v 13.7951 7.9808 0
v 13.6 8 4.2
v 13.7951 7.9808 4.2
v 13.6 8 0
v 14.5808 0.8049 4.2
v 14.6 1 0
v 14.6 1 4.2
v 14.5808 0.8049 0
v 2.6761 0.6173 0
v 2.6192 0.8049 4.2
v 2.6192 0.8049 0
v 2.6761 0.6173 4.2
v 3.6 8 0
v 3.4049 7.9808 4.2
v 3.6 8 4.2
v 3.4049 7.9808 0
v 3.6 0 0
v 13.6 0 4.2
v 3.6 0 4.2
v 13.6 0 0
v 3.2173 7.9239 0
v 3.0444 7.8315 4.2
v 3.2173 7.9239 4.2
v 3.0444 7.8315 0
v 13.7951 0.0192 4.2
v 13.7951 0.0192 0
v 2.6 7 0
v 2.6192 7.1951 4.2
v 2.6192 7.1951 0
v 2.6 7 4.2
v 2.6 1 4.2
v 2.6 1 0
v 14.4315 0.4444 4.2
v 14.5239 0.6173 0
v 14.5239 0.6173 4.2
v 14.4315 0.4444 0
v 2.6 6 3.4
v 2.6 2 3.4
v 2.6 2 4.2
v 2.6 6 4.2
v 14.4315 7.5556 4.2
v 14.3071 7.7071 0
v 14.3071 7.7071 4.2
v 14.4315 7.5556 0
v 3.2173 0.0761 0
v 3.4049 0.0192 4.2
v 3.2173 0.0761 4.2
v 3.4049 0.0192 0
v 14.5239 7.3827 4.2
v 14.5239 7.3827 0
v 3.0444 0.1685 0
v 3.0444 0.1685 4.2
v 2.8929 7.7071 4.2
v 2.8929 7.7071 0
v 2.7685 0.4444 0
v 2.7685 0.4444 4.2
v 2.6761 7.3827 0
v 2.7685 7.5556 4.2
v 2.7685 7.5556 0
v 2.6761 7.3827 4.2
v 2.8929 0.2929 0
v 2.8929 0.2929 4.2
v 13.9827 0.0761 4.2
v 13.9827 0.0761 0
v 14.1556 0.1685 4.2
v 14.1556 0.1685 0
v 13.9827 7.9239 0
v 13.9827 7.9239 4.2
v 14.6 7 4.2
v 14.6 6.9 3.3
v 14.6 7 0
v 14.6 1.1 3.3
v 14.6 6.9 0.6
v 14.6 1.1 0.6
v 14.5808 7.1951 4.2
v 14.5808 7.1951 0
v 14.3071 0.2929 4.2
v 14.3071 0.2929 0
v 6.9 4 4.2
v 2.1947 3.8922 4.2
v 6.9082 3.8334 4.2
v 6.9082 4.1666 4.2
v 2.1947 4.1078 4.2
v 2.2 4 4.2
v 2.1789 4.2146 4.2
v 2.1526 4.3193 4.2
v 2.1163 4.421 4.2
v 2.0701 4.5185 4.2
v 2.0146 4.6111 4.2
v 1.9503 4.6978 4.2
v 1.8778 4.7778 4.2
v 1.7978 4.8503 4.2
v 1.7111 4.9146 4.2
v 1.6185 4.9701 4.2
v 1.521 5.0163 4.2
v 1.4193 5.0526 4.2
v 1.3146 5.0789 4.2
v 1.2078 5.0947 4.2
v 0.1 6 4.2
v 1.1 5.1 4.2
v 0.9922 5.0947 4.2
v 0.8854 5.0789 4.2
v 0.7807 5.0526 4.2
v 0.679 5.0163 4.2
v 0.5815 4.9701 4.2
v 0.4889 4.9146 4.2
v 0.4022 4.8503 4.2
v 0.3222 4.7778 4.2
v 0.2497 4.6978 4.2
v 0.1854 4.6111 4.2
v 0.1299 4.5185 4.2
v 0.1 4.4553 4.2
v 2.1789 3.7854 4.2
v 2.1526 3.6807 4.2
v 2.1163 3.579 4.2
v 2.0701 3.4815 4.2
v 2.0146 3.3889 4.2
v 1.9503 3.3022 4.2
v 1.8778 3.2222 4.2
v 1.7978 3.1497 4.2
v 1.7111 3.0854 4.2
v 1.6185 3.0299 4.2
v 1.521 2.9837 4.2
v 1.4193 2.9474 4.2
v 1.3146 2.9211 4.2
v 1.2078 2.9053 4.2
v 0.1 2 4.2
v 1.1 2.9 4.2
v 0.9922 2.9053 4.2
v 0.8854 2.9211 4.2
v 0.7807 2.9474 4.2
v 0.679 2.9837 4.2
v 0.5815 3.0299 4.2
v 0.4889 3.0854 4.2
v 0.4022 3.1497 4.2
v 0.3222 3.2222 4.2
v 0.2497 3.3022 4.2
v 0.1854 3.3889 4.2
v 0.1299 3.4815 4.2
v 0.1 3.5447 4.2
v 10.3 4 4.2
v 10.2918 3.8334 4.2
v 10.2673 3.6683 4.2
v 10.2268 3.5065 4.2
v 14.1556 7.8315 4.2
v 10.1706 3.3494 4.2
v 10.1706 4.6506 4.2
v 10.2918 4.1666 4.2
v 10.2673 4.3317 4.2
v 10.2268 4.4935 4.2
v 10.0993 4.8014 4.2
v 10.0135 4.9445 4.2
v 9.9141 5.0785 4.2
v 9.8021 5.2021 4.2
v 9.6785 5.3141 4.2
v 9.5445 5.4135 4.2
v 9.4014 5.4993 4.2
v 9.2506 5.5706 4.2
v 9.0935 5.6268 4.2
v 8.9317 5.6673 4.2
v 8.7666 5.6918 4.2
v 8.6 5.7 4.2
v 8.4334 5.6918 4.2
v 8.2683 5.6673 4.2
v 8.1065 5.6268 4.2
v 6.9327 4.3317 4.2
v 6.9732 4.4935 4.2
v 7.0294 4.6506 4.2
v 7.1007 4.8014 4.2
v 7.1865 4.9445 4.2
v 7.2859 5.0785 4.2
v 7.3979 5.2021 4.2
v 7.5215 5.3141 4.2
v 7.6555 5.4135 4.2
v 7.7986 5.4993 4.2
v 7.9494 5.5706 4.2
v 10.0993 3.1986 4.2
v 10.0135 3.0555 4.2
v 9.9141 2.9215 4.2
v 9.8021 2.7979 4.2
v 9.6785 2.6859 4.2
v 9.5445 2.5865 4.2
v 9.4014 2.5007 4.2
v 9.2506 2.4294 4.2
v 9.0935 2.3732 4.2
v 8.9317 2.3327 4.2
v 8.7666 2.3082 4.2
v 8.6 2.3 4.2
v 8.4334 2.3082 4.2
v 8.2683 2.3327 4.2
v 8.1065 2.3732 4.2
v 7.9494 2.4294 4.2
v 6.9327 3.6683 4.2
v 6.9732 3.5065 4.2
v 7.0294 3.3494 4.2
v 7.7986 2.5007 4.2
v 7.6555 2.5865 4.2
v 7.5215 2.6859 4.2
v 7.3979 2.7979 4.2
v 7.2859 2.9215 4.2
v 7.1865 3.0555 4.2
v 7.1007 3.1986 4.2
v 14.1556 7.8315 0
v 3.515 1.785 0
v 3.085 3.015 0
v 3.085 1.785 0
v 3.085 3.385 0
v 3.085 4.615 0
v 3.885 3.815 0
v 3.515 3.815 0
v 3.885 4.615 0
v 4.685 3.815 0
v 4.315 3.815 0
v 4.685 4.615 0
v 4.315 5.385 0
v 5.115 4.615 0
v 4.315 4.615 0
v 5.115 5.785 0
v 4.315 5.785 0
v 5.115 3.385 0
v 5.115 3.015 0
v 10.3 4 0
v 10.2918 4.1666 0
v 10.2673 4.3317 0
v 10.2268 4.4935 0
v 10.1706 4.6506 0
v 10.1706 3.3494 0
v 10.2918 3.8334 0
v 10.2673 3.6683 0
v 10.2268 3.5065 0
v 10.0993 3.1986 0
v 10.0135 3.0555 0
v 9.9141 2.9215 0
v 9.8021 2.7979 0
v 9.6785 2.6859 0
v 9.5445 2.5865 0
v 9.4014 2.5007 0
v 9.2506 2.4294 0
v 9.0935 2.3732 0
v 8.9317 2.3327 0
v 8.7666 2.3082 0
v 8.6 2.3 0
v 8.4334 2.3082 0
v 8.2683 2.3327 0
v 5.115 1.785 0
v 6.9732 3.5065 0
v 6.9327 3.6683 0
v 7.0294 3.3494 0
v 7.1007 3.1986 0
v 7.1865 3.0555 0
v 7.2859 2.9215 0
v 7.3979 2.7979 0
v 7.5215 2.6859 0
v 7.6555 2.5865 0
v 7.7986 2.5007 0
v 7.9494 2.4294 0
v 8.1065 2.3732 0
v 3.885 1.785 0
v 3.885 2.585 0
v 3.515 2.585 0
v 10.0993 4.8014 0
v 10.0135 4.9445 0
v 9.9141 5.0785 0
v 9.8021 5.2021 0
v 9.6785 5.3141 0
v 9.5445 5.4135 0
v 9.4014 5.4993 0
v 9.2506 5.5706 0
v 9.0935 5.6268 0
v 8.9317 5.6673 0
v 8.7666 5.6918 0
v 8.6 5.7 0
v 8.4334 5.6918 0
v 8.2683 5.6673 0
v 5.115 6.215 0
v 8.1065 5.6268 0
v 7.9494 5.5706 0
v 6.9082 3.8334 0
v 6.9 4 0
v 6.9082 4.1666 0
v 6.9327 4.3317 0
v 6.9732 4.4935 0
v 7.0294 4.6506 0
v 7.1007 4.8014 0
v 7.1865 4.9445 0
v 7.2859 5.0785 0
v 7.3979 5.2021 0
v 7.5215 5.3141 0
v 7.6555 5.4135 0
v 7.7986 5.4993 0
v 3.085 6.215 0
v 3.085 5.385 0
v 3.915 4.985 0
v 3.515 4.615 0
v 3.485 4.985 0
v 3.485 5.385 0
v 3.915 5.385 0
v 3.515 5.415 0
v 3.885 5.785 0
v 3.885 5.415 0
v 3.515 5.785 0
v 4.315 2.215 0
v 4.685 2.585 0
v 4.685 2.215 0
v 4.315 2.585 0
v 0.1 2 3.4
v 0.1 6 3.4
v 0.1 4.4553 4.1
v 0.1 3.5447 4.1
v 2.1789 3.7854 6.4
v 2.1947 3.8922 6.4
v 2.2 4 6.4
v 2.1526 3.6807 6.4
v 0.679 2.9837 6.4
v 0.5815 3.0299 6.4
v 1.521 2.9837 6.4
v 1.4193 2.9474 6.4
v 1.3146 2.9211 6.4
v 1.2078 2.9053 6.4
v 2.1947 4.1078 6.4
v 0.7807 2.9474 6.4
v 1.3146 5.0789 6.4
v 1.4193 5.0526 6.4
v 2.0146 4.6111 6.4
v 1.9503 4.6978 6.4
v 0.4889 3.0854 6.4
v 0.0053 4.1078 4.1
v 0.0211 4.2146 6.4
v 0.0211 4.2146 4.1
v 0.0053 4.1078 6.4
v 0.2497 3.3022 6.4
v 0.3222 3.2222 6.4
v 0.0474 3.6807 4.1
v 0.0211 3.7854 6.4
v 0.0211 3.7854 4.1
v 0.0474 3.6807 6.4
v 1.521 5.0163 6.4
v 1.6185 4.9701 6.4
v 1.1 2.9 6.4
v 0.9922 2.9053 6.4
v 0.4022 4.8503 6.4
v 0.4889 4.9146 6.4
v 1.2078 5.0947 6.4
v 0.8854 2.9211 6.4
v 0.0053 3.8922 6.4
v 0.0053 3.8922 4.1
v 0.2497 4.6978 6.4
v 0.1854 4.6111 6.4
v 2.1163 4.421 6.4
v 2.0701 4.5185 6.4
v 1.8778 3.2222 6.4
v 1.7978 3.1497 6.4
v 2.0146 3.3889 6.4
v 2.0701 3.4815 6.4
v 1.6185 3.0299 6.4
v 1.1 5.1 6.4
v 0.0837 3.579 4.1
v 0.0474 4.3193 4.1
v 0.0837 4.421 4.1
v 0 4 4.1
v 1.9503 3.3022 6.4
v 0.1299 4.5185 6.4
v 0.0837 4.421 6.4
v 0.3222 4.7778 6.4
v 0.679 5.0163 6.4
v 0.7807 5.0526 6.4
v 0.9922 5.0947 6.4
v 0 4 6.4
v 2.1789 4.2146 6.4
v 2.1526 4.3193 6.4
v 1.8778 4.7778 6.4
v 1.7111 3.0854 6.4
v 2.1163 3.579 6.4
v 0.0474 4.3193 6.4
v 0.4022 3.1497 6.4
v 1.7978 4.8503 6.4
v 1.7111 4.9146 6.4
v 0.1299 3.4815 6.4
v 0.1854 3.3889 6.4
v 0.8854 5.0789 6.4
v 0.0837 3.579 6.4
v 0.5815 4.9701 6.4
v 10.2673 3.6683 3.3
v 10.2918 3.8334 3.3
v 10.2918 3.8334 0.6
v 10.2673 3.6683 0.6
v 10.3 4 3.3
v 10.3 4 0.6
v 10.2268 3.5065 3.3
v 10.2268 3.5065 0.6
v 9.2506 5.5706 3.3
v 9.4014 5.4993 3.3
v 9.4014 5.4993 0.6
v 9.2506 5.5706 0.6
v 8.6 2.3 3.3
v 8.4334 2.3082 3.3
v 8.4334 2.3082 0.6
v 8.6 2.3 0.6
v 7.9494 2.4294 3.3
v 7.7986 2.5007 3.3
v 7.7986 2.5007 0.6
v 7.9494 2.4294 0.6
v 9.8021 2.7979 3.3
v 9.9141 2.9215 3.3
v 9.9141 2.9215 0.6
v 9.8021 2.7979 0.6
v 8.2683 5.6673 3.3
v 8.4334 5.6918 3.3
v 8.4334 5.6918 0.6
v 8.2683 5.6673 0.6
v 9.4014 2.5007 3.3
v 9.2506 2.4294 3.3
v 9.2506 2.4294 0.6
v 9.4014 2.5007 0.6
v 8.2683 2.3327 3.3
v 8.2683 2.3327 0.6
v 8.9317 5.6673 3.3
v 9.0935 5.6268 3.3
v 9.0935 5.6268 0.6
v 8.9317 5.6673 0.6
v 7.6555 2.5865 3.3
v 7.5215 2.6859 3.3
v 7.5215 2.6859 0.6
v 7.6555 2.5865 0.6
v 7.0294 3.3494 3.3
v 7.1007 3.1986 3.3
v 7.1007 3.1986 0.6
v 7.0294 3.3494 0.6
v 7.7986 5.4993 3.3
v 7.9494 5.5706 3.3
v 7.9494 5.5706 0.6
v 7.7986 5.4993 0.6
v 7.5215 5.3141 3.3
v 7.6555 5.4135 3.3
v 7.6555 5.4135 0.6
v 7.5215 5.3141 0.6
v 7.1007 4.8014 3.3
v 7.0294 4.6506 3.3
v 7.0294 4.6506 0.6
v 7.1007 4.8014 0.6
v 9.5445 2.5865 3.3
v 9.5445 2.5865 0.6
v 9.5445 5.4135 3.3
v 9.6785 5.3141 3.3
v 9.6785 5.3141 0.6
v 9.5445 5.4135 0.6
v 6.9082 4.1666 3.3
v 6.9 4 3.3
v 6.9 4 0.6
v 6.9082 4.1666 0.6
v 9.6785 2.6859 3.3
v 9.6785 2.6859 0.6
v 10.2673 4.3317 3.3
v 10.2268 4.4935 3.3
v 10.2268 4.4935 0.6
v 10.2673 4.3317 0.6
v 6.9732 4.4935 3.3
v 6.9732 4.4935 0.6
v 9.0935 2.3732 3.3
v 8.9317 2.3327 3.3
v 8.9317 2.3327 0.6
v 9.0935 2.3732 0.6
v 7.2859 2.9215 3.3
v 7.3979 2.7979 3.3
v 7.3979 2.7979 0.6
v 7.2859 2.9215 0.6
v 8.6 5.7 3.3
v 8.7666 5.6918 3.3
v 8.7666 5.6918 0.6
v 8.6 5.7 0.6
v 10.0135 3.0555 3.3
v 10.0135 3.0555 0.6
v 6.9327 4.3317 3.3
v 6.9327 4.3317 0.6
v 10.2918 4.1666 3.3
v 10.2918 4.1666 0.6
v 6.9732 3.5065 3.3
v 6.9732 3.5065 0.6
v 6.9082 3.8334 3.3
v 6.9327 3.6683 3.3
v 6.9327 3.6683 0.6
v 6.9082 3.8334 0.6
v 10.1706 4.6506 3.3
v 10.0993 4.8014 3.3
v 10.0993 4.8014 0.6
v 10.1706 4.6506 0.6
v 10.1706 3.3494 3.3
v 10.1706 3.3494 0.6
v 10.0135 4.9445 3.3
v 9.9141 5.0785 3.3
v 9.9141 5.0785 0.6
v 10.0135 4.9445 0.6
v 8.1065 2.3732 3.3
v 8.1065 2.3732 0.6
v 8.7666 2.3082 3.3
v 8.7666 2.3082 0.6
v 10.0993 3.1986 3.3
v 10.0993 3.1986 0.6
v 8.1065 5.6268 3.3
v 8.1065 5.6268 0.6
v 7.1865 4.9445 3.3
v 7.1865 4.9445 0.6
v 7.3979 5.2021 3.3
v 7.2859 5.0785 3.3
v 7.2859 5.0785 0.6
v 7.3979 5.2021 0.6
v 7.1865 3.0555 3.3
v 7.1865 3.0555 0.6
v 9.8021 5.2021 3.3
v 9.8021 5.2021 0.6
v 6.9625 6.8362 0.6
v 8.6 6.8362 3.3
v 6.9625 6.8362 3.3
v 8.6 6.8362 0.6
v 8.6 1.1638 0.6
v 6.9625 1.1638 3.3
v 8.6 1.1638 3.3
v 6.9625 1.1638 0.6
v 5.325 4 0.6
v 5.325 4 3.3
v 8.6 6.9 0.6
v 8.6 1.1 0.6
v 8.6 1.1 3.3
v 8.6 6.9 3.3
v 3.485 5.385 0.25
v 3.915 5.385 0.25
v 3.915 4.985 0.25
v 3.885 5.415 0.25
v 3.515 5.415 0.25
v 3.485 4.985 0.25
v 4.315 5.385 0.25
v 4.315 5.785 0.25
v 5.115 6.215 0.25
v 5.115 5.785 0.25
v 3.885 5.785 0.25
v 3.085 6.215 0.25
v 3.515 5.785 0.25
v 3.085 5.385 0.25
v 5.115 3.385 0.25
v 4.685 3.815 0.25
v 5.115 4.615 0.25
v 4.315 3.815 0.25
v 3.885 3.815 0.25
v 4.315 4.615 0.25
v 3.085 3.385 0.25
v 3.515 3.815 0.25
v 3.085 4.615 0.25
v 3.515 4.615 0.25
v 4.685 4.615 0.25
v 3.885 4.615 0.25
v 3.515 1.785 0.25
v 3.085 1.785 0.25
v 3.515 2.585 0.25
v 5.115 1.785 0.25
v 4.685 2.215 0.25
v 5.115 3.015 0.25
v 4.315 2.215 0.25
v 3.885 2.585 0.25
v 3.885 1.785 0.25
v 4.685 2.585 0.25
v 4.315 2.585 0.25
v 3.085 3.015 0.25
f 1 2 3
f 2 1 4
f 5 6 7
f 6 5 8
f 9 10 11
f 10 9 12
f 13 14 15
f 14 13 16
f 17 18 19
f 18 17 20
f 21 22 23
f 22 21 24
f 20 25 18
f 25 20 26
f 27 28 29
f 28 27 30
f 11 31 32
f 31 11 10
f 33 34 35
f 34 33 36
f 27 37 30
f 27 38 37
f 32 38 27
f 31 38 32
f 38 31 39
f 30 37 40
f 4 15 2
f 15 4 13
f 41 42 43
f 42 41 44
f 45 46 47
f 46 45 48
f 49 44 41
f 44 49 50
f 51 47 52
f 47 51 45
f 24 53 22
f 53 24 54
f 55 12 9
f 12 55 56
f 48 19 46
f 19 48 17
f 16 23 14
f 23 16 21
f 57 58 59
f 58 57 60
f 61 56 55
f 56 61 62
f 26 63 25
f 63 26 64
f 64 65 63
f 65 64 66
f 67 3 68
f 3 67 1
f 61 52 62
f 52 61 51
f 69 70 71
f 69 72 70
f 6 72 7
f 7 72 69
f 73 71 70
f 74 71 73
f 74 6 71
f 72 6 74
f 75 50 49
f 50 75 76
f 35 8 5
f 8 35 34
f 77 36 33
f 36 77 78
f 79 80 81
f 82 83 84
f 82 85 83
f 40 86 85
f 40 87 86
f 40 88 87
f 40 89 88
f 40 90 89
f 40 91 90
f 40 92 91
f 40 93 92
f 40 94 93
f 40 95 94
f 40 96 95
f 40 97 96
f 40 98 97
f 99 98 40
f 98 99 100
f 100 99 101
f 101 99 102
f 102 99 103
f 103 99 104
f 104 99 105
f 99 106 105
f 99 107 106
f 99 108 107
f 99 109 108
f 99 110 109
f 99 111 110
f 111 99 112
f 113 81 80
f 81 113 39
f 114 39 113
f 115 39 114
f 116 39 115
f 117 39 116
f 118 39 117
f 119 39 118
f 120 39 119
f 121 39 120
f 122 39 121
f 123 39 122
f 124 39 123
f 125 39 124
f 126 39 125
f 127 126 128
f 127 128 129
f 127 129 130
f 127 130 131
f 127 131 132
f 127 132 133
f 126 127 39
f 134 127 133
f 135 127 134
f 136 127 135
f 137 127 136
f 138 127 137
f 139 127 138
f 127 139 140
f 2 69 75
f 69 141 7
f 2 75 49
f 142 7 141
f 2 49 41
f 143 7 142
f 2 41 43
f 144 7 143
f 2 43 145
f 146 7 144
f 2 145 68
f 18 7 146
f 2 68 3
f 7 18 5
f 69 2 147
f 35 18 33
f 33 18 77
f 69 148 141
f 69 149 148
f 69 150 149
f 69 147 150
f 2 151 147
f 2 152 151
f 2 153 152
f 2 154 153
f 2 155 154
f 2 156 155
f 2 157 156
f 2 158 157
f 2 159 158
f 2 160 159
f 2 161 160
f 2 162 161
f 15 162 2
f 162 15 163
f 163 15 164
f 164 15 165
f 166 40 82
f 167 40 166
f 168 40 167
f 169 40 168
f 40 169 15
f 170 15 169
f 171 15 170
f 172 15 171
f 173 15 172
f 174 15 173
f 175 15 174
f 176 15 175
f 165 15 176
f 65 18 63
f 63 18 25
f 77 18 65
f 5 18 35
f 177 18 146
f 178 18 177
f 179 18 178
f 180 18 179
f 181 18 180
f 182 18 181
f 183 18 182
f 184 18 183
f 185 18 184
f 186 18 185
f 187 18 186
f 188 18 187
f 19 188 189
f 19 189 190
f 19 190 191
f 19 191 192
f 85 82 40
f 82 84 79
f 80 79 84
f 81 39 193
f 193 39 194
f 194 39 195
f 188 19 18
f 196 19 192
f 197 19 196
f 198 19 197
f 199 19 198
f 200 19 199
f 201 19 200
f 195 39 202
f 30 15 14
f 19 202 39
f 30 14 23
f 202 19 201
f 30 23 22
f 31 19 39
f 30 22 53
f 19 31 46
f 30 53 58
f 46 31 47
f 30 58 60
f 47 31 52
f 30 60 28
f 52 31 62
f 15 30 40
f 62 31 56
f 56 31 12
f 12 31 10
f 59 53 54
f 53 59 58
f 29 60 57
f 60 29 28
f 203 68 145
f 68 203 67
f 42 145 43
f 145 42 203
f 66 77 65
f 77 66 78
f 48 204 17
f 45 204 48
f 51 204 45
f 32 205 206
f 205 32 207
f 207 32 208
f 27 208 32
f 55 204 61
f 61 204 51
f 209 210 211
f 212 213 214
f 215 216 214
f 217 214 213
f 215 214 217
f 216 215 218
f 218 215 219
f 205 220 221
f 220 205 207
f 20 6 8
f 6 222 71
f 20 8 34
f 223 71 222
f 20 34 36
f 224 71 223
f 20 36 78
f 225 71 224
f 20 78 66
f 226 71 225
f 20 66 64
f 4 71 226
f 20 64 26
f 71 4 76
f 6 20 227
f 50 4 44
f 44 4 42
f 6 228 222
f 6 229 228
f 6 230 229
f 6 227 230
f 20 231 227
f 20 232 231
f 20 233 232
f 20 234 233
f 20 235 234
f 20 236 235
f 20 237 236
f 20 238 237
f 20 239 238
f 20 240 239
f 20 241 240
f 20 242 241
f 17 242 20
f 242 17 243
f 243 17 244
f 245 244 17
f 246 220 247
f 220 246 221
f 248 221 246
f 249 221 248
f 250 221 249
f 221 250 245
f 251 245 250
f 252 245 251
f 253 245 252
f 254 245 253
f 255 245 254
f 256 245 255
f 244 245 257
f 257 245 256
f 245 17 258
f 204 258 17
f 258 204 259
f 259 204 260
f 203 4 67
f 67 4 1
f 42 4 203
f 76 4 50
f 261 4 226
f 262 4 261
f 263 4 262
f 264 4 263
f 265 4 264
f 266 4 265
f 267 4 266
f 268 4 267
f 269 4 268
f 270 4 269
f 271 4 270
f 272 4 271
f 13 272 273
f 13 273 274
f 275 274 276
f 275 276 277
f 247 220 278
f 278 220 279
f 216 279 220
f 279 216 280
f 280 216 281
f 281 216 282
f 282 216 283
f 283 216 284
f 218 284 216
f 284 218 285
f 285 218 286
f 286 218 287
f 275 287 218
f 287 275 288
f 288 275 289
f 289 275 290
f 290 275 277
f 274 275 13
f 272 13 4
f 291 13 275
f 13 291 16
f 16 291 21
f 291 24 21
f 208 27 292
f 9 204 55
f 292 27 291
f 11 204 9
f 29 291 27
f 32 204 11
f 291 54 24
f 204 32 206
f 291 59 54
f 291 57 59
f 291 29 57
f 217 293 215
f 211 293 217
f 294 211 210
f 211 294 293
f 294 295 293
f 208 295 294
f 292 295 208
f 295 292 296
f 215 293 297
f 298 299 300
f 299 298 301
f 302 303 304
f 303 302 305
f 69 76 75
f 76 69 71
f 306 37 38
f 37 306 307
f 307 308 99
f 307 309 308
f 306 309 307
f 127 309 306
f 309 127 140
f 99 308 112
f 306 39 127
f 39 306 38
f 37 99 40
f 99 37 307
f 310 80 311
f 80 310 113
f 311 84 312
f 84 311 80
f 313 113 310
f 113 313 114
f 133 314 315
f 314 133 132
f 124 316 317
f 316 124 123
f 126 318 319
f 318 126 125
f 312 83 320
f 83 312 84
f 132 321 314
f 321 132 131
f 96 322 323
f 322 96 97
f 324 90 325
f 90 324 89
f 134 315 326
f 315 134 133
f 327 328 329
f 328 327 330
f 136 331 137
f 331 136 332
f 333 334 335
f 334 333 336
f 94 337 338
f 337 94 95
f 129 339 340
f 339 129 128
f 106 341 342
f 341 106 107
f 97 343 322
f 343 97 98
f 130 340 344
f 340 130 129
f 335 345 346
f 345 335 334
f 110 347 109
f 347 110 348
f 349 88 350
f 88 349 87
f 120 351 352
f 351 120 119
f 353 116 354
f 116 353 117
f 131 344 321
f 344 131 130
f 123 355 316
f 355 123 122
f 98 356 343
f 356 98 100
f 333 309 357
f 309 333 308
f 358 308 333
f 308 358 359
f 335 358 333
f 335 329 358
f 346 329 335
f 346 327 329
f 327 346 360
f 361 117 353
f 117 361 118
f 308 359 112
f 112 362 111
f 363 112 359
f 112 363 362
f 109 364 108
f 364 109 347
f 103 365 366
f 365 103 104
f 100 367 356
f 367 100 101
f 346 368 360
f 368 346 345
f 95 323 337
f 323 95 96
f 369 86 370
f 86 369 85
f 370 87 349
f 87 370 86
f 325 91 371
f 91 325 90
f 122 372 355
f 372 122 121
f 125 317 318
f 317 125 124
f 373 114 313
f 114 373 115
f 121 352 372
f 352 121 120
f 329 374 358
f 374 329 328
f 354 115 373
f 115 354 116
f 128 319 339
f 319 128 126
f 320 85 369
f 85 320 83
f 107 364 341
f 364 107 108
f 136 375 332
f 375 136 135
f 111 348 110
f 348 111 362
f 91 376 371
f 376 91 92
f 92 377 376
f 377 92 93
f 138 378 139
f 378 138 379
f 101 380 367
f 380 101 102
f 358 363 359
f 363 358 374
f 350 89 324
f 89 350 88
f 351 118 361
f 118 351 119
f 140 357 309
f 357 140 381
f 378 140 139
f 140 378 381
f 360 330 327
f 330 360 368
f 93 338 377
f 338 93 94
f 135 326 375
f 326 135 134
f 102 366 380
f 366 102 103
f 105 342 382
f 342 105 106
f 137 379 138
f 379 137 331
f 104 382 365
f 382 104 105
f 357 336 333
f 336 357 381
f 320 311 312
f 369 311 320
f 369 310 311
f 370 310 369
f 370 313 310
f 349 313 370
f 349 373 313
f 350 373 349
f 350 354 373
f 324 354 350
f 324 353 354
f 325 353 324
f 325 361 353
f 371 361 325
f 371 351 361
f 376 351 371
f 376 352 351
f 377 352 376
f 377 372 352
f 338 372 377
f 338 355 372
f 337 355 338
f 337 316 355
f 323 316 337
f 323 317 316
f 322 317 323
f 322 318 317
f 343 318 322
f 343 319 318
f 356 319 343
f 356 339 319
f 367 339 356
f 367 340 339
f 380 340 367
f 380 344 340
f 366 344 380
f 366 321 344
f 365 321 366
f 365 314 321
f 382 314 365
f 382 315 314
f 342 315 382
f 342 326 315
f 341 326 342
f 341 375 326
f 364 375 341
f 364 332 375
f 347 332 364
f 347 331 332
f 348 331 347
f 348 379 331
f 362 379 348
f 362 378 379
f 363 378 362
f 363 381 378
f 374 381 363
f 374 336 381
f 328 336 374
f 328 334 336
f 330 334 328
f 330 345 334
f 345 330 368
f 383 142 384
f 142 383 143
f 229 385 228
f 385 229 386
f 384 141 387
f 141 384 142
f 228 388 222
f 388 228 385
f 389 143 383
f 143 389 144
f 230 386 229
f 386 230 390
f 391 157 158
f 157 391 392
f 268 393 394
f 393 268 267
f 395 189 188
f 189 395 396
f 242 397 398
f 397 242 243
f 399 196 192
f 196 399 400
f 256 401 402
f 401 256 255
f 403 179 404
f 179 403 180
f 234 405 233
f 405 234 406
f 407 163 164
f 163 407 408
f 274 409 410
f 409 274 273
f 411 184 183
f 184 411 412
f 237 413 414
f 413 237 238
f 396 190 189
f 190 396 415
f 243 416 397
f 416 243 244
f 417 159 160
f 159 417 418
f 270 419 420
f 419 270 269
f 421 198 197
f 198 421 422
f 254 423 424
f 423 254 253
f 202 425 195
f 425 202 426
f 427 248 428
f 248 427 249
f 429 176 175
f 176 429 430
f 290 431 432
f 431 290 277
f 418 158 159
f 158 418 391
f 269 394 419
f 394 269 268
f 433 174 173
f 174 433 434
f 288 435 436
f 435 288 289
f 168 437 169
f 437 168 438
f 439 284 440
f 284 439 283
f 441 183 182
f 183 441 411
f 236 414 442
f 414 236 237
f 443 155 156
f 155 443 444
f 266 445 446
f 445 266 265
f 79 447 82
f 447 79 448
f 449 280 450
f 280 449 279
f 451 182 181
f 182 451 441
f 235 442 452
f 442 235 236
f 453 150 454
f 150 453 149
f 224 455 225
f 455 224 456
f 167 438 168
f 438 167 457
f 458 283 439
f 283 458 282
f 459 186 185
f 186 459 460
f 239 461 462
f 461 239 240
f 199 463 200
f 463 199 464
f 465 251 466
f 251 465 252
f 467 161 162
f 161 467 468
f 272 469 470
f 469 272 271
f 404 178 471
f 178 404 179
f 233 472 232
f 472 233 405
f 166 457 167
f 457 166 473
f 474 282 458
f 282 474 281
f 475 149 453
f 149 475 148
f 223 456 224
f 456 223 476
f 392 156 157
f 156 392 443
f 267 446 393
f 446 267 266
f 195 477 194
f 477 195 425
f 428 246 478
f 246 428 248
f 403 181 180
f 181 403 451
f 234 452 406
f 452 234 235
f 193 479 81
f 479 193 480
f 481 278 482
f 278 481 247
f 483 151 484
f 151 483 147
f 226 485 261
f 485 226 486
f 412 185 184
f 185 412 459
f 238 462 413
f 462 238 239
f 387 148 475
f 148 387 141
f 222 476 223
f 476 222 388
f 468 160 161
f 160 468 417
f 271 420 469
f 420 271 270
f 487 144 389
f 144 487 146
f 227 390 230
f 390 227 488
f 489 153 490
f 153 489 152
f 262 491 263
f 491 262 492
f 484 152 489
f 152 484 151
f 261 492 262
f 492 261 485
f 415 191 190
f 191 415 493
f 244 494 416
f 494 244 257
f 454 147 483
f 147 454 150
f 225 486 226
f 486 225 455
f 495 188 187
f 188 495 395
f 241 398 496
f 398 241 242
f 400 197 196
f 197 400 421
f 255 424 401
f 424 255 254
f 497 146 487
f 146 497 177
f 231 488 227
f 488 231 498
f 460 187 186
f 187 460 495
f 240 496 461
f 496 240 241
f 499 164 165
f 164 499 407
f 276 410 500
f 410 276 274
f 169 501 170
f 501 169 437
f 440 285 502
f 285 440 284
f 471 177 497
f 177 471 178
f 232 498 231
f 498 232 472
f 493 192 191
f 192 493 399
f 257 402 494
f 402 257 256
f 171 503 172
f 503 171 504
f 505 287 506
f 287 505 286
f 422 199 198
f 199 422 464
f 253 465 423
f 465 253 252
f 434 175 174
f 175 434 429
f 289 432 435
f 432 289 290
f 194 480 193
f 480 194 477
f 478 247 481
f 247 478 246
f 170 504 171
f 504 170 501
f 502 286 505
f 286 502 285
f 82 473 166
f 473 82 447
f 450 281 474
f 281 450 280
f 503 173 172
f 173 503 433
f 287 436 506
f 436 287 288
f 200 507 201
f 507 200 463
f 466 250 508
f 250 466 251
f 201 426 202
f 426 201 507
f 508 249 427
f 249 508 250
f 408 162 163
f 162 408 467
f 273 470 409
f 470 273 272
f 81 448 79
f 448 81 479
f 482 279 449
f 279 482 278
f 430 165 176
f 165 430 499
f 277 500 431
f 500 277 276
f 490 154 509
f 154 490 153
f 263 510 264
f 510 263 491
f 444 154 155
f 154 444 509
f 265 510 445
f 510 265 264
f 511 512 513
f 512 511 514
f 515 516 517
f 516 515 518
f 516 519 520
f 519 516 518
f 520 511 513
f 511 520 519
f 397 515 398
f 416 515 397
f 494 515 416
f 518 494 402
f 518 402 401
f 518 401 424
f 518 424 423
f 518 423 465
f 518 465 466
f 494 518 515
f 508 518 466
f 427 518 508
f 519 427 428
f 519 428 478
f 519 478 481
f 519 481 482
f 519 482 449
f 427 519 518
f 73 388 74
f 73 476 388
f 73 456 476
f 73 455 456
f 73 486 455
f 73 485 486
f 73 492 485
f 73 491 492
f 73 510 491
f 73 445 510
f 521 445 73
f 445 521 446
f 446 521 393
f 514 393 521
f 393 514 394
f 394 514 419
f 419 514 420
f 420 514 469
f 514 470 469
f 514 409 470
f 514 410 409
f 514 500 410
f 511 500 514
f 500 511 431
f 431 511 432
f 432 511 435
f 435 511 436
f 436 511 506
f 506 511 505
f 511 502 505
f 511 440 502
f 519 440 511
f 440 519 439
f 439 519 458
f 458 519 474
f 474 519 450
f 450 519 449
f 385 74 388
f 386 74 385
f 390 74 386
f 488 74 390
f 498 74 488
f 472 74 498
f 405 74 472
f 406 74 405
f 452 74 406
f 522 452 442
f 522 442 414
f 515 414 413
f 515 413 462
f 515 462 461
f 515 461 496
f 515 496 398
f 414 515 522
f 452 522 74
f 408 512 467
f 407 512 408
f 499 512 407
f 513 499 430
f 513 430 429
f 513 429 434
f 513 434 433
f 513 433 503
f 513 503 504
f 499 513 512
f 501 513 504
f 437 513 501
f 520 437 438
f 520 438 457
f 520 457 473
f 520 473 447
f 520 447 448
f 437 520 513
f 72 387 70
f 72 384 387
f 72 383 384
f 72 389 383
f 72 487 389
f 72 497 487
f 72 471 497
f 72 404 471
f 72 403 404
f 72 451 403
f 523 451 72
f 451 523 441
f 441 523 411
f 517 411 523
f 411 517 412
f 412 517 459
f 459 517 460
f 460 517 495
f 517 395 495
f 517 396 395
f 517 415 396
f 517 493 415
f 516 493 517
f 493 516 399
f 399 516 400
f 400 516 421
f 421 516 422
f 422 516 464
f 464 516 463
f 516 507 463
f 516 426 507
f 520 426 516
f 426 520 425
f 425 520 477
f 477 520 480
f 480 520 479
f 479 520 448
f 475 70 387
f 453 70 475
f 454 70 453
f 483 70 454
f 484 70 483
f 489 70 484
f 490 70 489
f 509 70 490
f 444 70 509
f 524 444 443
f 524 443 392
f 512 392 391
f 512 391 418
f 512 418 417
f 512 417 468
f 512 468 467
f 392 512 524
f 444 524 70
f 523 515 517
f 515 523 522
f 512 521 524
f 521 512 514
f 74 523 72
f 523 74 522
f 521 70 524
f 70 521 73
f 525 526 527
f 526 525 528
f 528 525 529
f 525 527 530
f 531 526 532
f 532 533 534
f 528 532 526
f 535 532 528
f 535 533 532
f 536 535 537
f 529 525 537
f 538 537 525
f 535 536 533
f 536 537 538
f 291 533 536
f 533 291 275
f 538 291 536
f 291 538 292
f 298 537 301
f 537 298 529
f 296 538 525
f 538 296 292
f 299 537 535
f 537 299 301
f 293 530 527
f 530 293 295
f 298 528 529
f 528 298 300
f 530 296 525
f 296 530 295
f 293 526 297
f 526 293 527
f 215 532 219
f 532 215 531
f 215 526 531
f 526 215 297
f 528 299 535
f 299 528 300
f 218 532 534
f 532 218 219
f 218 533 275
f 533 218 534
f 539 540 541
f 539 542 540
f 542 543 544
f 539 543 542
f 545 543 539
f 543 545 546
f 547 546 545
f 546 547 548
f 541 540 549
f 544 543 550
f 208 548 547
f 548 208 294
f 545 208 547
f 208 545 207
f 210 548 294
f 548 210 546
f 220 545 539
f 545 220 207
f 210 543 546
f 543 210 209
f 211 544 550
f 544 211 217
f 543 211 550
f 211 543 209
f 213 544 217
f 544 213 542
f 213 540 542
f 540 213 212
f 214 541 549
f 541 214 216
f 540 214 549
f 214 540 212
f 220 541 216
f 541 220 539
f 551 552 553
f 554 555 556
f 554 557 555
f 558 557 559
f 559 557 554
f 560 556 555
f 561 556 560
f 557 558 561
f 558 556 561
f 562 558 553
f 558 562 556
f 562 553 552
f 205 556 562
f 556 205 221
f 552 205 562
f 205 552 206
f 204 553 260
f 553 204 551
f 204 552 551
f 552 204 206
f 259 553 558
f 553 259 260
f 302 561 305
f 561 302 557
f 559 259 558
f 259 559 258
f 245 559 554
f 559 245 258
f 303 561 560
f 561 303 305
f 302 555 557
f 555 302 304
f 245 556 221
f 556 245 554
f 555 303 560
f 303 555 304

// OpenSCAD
// 滑環法蘭壓片
$fn=64;
translate([-17.9,4,14]){rotate([180,0,0]){difference(){difference(){difference(){difference(){union(){union(){translate([26.5,0,0]){translate([0,0,9.8]){linear_extrude(height=4.2)polygon([[6,3],[5.98079,3.19509],[5.92388,3.38268],[5.83147,3.55557],[5.70711,3.70711],[5.55557,3.83147],[5.38268,3.92388],[5.19509,3.98079],[5,4],[-5,4],[-5.19509,3.98079],[-5.38268,3.92388],[-5.55557,3.83147],[-5.70711,3.70711],[-5.83147,3.55557],[-5.92388,3.38268],[-5.98079,3.19509],[-6,3],[-6,-3],[-5.98079,-3.19509],[-5.92388,-3.38268],[-5.83147,-3.55557],[-5.70711,-3.70711],[-5.55557,-3.83147],[-5.38268,-3.92388],[-5.19509,-3.98079],[-5,-4],[5,-4],[5.19509,-3.98079],[5.38268,-3.92388],[5.55557,-3.83147],[5.70711,-3.70711],[5.83147,-3.55557],[5.92388,-3.38268],[5.98079,-3.19509],[6,-3]]);}}translate([18,-2,9.8]){cube([5,4,0.8]);}}translate([19,0,7.6]){cylinder(h=2.3,d1=2.2,d2=2.2,$fn=64);}}translate([26.5,0,9]){cylinder(h=6,d1=3.4,d2=3.4,$fn=64);}}translate([26.5,0,10.7]){cylinder(h=2.7,d1=6.55,d2=6.55,$fn=6);}}translate([26.5,-2.9,10.7]){cube([9,5.8,2.7]);}}multmatrix([[0,-1,0,22],[1,0,0,0],[0,0,1,14],[0,0,0,1]]){union(){union(){union(){union(){union(){union(){union(){union(){union(){union(){union(){union(){union(){union(){union(){union(){union(){union(){union(){union(){union(){union(){union(){union(){union(){union(){union(){union(){union(){union(){translate([-2.215,0.585,-0.25]){cube([0.43,0.43,0.37]);}translate([-1.815,0.585,-0.25]){cube([0.43,0.43,0.37]);}}translate([-2.215,0.185,-0.25]){cube([0.43,0.43,0.37]);}}translate([-1.415,0.185,-0.25]){cube([0.43,0.43,0.37]);}}translate([-2.215,-0.215,-0.25]){cube([0.43,0.43,0.37]);}}translate([-1.815,-0.215,-0.25]){cube([0.43,0.43,0.37]);}}translate([-2.215,-0.615,-0.25]){cube([0.43,0.43,0.37]);}}translate([-2.215,-1.015,-0.25]){cube([0.43,0.43,0.37]);}}translate([-0.615,0.585,-0.25]){cube([0.43,0.43,0.37]);}}translate([-0.215,0.585,-0.25]){cube([0.43,0.43,0.37]);}}translate([0.185,0.585,-0.25]){cube([0.43,0.43,0.37]);}}translate([0.185,0.185,-0.25]){cube([0.43,0.43,0.37]);}}translate([-0.615,-0.215,-0.25]){cube([0.43,0.43,0.37]);}}translate([-0.215,-0.215,-0.25]){cube([0.43,0.43,0.37]);}}translate([0.185,-0.215,-0.25]){cube([0.43,0.43,0.37]);}}translate([0.185,-0.615,-0.25]){cube([0.43,0.43,0.37]);}}translate([-0.615,-1.015,-0.25]){cube([0.43,0.43,0.37]);}}translate([-0.215,-1.015,-0.25]){cube([0.43,0.43,0.37]);}}translate([0.185,-1.015,-0.25]){cube([0.43,0.43,0.37]);}}translate([0.985,0.585,-0.25]){cube([0.43,0.43,0.37]);}}translate([1.385,0.585,-0.25]){cube([0.43,0.43,0.37]);}}translate([1.785,0.585,-0.25]){cube([0.43,0.43,0.37]);}}translate([0.985,0.185,-0.25]){cube([0.43,0.43,0.37]);}}translate([0.985,-0.215,-0.25]){cube([0.43,0.43,0.37]);}}translate([1.385,-0.215,-0.25]){cube([0.43,0.43,0.37]);}}translate([1.785,-0.215,-0.25]){cube([0.43,0.43,0.37]);}}translate([0.985,-0.615,-0.25]){cube([0.43,0.43,0.37]);}}translate([1.785,-0.615,-0.25]){cube([0.43,0.43,0.37]);}}translate([0.985,-1.015,-0.25]){cube([0.43,0.43,0.37]);}}translate([1.385,-1.015,-0.25]){cube([0.43,0.43,0.37]);}}translate([1.785,-1.015,-0.25]){cube([0.43,0.43,0.37]);}}}}}}
